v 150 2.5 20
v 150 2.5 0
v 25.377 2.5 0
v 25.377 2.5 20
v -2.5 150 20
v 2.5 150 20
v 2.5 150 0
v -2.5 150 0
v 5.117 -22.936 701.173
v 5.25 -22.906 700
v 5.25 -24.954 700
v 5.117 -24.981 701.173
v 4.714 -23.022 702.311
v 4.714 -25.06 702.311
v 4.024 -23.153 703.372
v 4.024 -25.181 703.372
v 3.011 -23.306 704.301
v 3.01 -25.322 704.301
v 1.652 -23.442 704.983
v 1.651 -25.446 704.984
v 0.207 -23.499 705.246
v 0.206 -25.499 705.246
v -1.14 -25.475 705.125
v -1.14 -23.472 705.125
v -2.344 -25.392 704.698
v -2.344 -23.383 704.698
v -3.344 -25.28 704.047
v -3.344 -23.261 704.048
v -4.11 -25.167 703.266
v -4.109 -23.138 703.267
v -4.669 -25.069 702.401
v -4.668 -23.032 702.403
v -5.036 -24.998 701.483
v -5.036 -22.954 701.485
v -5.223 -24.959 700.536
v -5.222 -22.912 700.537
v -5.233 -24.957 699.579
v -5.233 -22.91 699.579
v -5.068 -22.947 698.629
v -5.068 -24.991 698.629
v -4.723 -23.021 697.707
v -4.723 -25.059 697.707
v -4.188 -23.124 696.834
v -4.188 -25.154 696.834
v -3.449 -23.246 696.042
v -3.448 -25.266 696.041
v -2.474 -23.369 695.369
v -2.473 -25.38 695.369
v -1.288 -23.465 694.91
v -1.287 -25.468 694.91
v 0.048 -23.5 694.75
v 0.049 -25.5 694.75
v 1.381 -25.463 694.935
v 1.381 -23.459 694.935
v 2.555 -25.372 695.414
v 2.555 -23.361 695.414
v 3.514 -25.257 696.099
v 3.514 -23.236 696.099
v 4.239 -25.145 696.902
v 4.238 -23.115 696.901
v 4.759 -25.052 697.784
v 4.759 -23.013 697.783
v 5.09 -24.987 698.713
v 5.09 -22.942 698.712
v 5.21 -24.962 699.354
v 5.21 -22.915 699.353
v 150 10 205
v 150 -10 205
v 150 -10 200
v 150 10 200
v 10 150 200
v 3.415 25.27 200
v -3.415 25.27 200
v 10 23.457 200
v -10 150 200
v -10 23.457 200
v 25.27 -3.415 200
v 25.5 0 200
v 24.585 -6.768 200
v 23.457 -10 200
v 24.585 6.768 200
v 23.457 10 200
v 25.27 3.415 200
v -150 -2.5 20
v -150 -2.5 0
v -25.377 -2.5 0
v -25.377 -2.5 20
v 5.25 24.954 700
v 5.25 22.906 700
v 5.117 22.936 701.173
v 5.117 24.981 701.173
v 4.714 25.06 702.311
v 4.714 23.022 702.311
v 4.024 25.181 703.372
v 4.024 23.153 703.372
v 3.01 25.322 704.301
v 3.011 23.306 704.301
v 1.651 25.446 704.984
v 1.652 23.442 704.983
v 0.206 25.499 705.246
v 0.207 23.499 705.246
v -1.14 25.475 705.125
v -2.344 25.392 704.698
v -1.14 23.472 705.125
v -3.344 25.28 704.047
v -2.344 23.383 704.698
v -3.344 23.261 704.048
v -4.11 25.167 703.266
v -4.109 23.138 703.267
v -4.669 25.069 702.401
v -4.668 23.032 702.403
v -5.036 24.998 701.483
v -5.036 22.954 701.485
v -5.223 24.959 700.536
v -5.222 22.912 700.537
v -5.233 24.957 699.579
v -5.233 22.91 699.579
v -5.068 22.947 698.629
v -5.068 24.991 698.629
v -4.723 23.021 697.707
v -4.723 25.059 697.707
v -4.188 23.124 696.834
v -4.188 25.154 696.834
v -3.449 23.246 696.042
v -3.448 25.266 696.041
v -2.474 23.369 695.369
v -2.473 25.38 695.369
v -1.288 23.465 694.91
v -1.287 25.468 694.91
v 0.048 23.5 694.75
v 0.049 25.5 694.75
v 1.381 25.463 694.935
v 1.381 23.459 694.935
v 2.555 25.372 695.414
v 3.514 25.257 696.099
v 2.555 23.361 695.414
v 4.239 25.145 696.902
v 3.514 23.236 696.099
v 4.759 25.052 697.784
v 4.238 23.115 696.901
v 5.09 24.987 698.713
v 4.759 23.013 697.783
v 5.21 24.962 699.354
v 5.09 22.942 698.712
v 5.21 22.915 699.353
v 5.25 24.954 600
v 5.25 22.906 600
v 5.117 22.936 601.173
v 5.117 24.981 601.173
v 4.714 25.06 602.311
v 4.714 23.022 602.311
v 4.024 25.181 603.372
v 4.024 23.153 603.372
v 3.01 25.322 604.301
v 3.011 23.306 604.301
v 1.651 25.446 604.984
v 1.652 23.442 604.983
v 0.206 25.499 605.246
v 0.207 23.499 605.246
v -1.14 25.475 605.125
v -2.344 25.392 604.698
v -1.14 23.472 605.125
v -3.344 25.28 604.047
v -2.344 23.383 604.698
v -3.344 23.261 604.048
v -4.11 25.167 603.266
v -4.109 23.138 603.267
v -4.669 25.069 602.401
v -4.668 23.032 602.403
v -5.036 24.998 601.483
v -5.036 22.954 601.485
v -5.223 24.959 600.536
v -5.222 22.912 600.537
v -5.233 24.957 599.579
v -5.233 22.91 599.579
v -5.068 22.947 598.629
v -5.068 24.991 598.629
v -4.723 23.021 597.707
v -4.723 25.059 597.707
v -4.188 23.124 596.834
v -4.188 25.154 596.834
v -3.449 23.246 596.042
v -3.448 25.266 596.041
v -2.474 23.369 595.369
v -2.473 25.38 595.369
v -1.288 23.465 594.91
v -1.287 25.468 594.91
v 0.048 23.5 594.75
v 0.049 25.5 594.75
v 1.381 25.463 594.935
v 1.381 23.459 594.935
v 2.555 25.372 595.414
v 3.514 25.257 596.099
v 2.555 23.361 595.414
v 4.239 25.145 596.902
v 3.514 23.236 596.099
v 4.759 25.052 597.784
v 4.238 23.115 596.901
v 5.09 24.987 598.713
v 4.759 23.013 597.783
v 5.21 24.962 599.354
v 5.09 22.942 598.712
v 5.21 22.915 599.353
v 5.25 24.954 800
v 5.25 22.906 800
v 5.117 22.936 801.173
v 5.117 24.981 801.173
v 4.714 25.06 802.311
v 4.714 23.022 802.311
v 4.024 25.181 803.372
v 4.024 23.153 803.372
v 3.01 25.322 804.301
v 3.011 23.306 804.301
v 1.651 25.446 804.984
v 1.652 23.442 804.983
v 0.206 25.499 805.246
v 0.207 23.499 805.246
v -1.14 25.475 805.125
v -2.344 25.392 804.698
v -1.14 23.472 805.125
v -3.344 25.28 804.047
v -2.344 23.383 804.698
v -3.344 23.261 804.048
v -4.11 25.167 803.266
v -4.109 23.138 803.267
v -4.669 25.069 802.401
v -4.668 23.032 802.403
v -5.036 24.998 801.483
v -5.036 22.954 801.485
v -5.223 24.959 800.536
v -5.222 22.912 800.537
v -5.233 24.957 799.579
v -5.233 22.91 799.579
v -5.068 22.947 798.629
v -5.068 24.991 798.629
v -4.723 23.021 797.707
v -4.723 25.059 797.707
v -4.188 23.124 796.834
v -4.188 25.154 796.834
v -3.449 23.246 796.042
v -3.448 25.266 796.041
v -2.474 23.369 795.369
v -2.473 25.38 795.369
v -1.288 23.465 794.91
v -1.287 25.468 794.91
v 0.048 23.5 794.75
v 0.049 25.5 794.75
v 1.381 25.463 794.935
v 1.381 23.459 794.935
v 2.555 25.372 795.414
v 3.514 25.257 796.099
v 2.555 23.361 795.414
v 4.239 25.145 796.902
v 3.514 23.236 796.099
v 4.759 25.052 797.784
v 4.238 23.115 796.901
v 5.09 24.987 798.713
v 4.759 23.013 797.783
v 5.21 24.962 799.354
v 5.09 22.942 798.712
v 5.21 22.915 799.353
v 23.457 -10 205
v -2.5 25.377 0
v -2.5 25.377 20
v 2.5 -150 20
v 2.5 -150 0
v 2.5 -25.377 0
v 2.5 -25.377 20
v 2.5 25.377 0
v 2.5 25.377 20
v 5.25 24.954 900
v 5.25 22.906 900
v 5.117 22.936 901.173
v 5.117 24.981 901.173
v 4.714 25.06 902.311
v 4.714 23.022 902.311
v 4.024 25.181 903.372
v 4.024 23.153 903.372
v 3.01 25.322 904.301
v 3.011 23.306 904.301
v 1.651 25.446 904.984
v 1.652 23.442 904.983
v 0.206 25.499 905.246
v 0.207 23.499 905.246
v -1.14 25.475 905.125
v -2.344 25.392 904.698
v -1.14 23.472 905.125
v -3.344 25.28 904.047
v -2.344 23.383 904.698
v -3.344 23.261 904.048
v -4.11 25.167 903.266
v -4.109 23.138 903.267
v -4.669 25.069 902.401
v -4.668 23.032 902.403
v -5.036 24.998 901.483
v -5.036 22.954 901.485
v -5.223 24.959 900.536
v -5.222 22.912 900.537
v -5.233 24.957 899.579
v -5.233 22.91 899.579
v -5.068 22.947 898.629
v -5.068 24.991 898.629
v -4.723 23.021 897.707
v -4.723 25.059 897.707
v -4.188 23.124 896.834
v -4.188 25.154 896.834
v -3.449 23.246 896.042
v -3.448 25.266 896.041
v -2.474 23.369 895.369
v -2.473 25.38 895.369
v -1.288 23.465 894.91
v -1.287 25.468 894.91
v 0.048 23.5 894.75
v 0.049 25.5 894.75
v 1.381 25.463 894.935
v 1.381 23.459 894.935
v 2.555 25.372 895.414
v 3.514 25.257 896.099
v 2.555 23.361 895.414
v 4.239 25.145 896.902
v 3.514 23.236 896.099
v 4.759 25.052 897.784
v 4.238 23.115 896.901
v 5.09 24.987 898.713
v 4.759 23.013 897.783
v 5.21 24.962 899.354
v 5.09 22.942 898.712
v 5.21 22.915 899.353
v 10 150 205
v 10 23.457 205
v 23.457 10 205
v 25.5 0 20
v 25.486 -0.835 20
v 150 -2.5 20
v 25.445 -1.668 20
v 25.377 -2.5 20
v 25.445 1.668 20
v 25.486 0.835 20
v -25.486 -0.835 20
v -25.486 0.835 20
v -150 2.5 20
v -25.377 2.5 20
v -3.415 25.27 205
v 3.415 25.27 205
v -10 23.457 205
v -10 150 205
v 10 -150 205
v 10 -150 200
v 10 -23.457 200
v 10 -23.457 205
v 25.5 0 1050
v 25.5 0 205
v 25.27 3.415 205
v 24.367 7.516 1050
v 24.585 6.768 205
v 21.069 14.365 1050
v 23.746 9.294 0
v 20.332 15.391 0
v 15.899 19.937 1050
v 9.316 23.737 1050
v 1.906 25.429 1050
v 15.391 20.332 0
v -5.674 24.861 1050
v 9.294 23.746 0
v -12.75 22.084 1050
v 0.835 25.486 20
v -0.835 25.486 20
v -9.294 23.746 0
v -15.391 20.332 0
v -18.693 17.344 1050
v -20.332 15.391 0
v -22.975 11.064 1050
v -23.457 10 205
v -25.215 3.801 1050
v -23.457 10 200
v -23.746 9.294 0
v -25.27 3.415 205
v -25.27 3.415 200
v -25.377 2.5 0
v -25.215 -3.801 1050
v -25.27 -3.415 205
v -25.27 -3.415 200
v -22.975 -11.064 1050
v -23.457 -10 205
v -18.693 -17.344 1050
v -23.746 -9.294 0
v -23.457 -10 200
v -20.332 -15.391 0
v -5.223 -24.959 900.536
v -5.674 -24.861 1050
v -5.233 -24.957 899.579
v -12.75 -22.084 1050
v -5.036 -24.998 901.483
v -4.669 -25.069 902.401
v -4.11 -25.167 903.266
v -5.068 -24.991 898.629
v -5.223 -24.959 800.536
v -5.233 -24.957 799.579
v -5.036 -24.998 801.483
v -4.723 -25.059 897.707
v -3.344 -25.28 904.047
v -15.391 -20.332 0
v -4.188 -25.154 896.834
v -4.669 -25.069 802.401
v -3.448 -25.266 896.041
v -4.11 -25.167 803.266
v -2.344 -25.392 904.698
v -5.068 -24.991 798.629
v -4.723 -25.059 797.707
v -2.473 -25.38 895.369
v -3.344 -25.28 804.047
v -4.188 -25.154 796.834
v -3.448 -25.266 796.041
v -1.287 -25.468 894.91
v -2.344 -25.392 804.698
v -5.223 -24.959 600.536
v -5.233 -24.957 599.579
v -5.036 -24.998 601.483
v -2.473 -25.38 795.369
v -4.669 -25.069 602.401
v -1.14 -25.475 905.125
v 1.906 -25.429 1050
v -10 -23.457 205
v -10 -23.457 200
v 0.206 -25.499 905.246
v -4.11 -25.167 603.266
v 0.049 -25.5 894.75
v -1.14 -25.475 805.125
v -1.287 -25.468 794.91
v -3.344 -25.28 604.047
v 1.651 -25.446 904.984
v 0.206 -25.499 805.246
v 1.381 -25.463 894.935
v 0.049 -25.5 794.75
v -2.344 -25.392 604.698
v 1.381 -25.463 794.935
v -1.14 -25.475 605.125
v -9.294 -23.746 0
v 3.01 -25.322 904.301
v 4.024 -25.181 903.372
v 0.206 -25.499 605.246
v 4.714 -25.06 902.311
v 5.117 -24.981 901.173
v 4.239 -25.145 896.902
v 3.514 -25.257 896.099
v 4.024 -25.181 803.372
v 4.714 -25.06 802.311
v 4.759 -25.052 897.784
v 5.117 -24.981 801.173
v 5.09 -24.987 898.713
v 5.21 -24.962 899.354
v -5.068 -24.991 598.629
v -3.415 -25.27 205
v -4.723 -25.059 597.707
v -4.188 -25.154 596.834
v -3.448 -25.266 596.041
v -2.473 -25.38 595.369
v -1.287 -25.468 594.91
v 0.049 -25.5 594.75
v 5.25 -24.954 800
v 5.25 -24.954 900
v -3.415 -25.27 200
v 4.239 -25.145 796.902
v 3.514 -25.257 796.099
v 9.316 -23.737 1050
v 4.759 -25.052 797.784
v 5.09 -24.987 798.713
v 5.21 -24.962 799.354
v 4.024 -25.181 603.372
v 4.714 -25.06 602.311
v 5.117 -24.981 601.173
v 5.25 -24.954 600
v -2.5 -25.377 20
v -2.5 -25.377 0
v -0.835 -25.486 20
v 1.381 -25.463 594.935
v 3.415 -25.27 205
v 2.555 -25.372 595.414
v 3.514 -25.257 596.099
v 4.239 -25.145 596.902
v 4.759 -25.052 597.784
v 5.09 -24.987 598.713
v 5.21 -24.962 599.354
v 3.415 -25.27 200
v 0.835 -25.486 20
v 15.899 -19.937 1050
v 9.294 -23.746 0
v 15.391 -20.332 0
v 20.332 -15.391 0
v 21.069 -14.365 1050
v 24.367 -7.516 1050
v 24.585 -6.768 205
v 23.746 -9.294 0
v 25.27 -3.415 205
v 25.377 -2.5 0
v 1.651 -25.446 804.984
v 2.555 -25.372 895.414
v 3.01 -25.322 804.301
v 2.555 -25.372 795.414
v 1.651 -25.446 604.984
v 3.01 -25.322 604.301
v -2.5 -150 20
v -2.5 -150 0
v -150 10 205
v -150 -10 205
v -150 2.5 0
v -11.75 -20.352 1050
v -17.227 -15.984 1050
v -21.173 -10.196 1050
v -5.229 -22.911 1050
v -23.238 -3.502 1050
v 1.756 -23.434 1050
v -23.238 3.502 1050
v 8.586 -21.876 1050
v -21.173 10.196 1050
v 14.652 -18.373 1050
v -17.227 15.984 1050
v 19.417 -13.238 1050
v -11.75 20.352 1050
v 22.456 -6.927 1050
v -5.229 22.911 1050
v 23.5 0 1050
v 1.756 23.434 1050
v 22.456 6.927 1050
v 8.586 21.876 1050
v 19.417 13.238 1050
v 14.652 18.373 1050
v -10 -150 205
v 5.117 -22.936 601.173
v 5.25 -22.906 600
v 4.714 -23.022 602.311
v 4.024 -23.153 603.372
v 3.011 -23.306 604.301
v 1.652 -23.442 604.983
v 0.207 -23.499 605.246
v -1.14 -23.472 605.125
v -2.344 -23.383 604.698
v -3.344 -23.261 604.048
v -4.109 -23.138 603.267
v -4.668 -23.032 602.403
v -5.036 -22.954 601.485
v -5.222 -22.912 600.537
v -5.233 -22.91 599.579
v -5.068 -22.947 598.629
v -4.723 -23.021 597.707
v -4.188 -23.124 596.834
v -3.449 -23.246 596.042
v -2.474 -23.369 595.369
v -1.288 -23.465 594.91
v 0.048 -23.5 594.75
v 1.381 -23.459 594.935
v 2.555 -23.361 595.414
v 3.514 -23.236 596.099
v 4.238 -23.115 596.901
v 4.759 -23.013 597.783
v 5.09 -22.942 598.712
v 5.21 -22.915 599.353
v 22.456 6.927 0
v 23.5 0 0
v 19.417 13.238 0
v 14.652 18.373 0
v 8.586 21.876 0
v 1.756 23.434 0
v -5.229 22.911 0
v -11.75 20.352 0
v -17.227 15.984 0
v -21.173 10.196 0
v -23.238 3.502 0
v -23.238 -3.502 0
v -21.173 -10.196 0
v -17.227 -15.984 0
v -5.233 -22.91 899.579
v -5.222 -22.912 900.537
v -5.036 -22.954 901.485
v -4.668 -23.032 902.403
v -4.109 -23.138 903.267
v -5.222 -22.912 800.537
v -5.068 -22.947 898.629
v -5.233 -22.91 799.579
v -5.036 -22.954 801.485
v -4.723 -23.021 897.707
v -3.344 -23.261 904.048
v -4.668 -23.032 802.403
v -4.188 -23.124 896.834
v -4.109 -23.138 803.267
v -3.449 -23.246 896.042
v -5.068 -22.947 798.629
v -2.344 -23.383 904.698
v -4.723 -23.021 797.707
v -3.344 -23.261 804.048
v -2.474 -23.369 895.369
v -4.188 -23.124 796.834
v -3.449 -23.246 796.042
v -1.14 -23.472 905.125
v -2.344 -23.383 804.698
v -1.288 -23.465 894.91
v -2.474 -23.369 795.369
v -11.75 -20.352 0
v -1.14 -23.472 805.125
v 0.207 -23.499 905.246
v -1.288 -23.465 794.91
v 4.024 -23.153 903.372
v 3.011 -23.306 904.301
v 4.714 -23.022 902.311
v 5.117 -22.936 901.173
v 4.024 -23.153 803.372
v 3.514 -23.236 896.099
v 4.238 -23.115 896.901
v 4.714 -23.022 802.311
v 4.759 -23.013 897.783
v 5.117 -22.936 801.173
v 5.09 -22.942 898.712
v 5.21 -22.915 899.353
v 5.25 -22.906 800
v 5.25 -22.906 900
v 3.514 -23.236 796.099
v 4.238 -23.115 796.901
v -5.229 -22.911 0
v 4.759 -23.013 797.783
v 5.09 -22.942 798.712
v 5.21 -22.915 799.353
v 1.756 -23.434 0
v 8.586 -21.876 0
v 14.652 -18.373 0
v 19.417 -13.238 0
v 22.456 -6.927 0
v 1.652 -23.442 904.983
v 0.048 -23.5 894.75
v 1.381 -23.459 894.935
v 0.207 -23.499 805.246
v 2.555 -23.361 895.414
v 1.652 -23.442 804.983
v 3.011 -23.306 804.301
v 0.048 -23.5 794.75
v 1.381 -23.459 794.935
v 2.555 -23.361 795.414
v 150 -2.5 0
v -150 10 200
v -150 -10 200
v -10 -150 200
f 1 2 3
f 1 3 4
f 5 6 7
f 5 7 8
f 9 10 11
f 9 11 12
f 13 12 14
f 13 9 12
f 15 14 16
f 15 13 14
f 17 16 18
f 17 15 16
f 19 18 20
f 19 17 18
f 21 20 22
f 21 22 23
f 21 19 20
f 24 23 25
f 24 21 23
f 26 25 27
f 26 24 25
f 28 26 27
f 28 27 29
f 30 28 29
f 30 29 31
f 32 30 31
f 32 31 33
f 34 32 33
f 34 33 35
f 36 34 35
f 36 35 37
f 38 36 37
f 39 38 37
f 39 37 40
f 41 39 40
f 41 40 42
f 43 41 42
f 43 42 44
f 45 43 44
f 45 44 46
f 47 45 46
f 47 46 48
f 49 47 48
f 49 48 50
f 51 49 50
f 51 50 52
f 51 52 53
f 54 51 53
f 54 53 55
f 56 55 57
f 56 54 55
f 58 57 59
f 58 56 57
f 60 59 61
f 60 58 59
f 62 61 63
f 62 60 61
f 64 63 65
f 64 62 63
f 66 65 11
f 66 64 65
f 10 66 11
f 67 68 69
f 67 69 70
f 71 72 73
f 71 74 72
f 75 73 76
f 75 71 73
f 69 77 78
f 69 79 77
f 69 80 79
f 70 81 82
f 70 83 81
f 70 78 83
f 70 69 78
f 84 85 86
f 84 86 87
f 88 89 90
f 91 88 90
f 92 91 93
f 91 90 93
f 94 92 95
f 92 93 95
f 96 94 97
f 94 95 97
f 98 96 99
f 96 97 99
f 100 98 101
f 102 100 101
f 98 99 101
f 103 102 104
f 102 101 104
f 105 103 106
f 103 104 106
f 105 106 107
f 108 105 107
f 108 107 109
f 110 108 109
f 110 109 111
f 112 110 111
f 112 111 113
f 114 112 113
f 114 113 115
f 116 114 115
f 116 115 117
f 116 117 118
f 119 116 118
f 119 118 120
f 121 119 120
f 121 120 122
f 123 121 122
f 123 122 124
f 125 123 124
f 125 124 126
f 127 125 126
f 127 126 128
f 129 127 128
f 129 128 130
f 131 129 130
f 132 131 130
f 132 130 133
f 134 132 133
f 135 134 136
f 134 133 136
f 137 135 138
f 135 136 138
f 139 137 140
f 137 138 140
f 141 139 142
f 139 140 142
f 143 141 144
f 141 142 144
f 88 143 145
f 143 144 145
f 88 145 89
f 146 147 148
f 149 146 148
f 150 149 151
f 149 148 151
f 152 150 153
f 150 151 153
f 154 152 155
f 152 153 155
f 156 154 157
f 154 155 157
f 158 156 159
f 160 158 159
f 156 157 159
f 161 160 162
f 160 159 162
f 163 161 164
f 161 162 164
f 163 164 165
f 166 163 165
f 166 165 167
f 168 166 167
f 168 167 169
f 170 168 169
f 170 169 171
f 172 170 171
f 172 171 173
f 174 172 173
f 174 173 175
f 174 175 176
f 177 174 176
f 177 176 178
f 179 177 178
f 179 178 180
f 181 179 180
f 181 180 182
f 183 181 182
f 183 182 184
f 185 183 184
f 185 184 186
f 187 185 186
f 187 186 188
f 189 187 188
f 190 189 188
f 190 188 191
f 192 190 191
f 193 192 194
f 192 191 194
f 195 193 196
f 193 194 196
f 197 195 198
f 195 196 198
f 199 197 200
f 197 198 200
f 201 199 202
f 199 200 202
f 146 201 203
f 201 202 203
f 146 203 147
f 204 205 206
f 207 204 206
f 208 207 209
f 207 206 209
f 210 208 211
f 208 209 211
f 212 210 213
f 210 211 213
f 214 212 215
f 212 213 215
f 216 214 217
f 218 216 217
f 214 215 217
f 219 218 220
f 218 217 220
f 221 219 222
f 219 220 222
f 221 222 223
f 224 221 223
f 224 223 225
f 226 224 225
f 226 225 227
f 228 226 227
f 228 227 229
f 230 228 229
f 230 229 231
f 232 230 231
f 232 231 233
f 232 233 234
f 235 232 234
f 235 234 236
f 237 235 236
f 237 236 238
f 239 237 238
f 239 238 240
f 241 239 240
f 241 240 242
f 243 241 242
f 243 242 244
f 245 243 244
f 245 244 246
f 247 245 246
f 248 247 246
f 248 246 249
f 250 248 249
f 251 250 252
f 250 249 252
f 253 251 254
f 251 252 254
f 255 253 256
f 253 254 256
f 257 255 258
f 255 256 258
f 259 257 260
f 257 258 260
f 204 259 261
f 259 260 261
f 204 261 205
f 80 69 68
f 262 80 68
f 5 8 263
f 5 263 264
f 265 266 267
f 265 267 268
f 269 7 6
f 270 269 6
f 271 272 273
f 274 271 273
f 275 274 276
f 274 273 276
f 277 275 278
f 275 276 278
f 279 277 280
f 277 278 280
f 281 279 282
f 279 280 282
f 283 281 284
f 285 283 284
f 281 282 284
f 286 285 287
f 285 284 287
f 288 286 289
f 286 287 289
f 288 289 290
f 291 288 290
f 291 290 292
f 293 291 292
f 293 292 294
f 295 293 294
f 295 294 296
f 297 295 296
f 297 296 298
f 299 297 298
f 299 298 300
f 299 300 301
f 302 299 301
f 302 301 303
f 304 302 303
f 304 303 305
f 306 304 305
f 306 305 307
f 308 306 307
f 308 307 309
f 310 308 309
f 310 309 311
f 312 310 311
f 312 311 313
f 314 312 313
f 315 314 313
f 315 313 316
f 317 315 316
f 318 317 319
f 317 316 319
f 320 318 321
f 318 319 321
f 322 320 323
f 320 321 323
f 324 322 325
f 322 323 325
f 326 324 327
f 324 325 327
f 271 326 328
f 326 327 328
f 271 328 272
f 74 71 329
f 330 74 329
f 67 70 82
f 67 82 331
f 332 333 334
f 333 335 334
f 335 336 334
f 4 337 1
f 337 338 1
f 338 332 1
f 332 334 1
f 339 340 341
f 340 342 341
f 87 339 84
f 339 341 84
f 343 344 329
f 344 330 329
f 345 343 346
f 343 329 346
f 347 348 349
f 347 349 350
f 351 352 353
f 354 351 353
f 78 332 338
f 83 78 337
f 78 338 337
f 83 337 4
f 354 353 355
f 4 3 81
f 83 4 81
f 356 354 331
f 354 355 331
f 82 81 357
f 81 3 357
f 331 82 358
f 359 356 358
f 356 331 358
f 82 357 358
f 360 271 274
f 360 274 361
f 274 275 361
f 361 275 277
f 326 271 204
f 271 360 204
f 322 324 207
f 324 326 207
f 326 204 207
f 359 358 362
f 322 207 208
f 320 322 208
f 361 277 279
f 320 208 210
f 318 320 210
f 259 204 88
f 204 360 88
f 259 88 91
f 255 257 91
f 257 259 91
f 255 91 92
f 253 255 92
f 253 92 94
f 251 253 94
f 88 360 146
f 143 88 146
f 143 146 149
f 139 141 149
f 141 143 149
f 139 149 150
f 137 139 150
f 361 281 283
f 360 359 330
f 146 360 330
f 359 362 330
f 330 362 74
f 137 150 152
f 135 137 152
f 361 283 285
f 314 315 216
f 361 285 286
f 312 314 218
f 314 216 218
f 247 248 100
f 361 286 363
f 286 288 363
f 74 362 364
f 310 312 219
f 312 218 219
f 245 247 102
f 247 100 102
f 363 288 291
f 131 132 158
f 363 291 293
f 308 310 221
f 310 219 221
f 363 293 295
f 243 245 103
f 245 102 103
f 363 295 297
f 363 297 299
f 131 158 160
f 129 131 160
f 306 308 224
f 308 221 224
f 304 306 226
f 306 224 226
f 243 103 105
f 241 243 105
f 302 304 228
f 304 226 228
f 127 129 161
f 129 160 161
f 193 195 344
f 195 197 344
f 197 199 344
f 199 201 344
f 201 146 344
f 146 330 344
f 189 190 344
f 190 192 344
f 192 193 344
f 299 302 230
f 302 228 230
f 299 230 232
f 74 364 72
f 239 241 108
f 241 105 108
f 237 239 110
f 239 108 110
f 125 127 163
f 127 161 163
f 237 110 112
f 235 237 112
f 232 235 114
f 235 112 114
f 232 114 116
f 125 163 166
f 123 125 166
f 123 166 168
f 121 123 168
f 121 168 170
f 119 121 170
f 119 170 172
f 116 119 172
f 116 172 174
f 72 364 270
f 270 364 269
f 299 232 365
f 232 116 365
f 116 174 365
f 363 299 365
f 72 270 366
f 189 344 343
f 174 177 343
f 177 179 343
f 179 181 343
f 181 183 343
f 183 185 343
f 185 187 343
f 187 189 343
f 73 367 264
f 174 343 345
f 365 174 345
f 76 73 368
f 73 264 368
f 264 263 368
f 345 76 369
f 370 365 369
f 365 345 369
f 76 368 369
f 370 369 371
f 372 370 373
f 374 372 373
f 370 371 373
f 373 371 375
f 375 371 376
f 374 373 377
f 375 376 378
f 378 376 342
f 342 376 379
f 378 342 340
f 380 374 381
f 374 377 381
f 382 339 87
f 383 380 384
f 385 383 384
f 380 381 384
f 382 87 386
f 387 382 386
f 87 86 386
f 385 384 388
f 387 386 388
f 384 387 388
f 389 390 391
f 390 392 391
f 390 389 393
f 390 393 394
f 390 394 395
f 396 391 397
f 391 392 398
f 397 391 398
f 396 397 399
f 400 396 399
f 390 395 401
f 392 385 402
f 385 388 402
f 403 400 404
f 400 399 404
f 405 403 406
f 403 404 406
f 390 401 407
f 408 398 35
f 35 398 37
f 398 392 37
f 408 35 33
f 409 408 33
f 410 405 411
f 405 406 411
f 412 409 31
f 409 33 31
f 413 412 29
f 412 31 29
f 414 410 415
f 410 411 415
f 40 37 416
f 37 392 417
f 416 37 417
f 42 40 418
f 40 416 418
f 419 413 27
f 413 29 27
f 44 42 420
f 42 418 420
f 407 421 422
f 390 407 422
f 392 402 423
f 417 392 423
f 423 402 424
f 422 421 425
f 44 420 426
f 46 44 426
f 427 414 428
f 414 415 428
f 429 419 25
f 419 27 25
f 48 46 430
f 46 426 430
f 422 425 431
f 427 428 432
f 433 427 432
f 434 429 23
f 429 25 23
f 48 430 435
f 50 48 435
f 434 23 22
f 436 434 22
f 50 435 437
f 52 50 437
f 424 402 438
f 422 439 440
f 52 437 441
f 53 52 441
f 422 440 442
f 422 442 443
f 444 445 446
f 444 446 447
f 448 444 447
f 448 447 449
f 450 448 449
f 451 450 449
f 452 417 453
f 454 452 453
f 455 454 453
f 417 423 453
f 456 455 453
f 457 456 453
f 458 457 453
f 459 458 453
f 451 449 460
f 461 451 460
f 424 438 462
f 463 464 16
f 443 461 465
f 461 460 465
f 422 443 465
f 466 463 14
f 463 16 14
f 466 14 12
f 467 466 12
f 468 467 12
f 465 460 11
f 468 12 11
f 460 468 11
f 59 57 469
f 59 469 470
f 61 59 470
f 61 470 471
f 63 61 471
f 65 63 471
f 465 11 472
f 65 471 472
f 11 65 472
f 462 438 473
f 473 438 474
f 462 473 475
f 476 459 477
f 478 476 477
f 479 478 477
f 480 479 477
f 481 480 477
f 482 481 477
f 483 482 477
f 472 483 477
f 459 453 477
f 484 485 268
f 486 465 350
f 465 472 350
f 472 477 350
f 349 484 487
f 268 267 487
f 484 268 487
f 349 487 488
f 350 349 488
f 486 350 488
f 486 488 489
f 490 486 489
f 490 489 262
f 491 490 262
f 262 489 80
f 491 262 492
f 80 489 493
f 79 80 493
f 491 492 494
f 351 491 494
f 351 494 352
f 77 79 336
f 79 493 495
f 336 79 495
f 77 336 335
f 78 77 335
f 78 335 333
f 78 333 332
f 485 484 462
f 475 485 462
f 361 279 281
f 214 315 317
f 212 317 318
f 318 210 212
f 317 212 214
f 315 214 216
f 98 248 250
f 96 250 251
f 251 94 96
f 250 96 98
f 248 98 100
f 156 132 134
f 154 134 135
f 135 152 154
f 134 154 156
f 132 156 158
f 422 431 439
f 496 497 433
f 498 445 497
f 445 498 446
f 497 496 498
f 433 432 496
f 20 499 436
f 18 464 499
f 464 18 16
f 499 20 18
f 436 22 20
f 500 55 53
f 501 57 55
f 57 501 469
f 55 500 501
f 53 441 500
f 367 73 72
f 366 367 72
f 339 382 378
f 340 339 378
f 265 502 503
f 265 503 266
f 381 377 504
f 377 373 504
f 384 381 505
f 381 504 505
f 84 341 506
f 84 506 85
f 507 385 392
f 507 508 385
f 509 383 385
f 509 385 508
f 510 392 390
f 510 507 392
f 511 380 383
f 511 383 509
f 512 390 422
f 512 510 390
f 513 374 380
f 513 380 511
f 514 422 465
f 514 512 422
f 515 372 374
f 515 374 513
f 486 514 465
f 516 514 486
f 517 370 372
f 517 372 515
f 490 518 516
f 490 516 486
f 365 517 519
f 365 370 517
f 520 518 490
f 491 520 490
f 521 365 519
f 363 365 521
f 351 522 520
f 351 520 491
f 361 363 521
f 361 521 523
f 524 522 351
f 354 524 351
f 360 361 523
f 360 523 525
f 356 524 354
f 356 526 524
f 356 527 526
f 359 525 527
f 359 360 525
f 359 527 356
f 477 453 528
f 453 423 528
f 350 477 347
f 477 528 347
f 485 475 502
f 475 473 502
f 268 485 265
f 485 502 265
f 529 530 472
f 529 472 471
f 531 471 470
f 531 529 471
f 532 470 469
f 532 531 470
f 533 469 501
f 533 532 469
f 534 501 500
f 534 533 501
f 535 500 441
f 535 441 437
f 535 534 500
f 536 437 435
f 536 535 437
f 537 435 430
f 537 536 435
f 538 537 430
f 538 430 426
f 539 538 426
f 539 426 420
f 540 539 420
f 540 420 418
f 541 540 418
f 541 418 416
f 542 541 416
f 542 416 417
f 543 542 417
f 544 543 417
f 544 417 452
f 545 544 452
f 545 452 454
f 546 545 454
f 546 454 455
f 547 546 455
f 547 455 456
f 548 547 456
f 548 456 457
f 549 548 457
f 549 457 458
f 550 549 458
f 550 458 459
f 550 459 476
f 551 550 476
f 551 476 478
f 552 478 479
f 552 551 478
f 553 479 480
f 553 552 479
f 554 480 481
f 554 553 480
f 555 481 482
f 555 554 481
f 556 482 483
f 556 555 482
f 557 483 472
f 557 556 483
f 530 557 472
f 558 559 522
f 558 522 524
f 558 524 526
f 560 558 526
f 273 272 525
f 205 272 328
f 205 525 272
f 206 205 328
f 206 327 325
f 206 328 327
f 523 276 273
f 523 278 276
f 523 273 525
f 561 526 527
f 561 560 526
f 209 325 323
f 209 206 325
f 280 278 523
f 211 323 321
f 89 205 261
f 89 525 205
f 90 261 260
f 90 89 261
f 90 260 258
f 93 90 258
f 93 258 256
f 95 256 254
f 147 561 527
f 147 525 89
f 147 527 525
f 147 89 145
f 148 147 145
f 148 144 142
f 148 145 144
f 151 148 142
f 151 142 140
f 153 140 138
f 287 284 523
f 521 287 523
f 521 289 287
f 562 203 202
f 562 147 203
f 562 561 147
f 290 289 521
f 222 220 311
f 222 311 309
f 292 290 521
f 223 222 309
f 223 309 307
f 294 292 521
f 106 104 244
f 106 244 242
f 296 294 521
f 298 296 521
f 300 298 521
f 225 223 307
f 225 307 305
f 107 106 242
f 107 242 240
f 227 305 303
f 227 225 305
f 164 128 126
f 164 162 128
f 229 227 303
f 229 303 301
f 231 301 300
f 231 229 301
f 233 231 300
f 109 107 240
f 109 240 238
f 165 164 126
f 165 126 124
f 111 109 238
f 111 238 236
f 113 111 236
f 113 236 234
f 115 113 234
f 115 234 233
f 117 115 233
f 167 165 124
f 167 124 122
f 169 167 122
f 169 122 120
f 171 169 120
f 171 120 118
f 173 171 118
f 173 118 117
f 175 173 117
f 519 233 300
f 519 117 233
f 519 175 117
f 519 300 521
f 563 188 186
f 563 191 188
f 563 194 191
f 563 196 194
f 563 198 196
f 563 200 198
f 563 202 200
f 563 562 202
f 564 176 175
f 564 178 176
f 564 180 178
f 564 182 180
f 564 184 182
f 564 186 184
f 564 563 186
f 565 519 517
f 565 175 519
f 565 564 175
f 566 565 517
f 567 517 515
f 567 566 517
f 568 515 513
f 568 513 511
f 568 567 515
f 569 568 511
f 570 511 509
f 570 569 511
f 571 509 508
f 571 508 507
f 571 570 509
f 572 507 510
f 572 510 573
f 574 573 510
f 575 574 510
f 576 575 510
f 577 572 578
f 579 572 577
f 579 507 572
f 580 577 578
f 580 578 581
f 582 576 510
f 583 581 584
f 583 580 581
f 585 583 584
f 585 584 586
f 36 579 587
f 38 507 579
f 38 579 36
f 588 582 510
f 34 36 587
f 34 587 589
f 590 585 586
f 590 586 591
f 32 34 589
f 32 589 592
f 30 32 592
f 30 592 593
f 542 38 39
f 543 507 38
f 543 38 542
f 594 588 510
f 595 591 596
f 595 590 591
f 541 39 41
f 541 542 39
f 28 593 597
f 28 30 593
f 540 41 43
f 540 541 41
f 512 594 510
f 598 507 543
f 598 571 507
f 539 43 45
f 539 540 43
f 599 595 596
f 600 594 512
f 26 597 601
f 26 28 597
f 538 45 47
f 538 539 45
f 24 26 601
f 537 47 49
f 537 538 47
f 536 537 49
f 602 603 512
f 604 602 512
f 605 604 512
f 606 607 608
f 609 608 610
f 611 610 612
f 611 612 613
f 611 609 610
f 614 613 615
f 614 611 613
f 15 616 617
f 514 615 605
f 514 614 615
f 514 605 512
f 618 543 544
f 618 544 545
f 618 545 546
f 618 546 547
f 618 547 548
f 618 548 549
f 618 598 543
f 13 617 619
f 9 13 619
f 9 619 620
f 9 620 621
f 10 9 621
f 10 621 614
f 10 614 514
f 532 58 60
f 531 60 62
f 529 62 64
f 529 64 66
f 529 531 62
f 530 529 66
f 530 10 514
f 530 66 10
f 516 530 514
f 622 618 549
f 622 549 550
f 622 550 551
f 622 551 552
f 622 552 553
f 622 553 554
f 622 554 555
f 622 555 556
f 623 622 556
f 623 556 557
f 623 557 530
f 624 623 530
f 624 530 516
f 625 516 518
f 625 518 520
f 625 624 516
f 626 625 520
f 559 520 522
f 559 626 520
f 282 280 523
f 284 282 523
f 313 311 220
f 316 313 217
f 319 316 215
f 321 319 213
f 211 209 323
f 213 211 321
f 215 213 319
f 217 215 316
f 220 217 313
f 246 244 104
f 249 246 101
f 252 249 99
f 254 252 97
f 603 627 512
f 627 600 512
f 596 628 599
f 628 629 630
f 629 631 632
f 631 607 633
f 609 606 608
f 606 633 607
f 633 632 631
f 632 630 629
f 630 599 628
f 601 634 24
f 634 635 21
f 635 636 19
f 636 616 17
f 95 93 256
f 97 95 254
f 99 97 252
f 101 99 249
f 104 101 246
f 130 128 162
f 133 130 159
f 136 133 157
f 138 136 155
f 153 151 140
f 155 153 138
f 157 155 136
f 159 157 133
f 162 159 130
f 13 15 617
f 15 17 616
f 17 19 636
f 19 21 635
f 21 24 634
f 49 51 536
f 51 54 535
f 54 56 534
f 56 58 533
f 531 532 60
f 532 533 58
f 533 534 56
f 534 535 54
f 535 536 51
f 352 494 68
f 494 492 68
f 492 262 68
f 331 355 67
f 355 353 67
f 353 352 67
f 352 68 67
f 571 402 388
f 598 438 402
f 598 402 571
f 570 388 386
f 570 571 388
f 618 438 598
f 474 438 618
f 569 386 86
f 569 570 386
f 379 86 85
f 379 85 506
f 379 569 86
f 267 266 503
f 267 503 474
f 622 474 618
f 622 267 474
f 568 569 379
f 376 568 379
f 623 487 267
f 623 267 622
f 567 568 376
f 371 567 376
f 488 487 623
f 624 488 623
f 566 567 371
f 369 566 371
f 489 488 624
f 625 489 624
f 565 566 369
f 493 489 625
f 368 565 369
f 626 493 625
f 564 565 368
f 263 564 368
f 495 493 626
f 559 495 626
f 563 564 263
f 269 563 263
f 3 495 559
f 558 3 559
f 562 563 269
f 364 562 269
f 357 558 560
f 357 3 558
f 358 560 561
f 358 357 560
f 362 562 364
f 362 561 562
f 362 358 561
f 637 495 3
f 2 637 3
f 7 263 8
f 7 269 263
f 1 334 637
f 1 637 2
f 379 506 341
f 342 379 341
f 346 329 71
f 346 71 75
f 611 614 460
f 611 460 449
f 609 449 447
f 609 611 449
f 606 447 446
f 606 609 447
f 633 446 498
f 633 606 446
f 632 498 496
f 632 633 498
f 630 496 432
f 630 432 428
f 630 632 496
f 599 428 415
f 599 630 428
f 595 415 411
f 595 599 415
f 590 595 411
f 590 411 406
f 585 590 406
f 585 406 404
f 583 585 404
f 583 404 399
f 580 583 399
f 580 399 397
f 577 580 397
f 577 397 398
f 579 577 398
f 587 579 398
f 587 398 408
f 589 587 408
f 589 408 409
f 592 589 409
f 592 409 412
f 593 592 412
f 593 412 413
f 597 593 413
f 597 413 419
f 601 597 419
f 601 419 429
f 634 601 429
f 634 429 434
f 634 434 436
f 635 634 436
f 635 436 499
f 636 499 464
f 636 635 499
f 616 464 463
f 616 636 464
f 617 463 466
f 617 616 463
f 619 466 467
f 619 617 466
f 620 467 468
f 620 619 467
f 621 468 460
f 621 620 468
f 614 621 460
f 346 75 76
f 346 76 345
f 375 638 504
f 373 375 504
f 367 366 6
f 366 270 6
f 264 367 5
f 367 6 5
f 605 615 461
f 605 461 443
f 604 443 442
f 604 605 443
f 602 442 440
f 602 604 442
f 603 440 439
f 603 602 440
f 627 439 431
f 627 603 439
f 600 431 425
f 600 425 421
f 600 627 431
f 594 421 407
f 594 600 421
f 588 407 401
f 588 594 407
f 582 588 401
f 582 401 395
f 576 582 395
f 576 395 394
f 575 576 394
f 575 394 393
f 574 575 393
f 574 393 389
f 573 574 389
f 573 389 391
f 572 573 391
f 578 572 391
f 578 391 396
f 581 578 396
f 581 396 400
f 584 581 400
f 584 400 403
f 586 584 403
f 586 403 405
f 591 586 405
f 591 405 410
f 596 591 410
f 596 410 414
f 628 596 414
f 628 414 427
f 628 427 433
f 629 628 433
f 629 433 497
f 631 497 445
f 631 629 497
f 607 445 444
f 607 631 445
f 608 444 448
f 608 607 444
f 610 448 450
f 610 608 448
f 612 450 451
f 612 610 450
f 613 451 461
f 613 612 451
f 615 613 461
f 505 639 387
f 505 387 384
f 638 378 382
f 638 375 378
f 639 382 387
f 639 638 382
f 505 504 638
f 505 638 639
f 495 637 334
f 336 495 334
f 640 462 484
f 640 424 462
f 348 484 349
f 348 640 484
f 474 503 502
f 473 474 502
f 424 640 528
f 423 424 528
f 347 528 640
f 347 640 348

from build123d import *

# Parameters (mm, degrees)
F0_R            = 25.5
F0_R_2          = 23.5
F1_DEPTH        = 1050
F3_W            = 5
F3_H            = 20
F3_W_2          = 20
F3_H_2          = 5
F4_COPIES_COUNT = 4
F5_R            = 5.25
F6_DEPTH        = 150.001
F6_DEPTH_BACK   = 150.001


# Not quite as in the source:
# - a pattern or mirror of a feature is missing from the dataset's text; its kind, count and spacing are read off the source's solid


with BuildPart() as f1:
    # F0 (on Top) → F1 (new body)
    with BuildSketch(Plane.XY):
        Circle(F0_R)
        Circle(F0_R_2, mode=Mode.SUBTRACT)
    extrude(amount=F1_DEPTH)

    # F3 (on offset) → F4 (join, up to the next surface of F1)
    with BuildSketch(Plane.YZ.offset(150)):
        with Locations((0, 10)):
            Rectangle(F3_W, F3_H)
        with Locations((0, 202.5)):
            Rectangle(F3_W_2, F3_H_2)
    f4 = extrude(until=Until.NEXT, dir=(-1, 0, 0))

    # F4_copies: F4 ×4 about axis
    f4_copies_axis = Axis((0, 0, 0), (0, 0, 1))
    for i in range(1, F4_COPIES_COUNT):
        add(f4.rotate(f4_copies_axis, i * 360 / F4_COPIES_COUNT))

    # F5 (on Front) → F6 (cut, two sides)
    with BuildSketch(Plane.XZ) as f6_sk:
        with Locations((0, 600)):
            Circle(F5_R)
        with Locations((0, 700)):
            Circle(F5_R)
        with Locations((0, 800)):
            Circle(F5_R)
        with Locations((0, 900)):
            Circle(F5_R)
    extrude(amount=-F6_DEPTH, mode=Mode.SUBTRACT)
    extrude(f6_sk.sketch, amount=F6_DEPTH_BACK, mode=Mode.SUBTRACT)


solid = f1.part
